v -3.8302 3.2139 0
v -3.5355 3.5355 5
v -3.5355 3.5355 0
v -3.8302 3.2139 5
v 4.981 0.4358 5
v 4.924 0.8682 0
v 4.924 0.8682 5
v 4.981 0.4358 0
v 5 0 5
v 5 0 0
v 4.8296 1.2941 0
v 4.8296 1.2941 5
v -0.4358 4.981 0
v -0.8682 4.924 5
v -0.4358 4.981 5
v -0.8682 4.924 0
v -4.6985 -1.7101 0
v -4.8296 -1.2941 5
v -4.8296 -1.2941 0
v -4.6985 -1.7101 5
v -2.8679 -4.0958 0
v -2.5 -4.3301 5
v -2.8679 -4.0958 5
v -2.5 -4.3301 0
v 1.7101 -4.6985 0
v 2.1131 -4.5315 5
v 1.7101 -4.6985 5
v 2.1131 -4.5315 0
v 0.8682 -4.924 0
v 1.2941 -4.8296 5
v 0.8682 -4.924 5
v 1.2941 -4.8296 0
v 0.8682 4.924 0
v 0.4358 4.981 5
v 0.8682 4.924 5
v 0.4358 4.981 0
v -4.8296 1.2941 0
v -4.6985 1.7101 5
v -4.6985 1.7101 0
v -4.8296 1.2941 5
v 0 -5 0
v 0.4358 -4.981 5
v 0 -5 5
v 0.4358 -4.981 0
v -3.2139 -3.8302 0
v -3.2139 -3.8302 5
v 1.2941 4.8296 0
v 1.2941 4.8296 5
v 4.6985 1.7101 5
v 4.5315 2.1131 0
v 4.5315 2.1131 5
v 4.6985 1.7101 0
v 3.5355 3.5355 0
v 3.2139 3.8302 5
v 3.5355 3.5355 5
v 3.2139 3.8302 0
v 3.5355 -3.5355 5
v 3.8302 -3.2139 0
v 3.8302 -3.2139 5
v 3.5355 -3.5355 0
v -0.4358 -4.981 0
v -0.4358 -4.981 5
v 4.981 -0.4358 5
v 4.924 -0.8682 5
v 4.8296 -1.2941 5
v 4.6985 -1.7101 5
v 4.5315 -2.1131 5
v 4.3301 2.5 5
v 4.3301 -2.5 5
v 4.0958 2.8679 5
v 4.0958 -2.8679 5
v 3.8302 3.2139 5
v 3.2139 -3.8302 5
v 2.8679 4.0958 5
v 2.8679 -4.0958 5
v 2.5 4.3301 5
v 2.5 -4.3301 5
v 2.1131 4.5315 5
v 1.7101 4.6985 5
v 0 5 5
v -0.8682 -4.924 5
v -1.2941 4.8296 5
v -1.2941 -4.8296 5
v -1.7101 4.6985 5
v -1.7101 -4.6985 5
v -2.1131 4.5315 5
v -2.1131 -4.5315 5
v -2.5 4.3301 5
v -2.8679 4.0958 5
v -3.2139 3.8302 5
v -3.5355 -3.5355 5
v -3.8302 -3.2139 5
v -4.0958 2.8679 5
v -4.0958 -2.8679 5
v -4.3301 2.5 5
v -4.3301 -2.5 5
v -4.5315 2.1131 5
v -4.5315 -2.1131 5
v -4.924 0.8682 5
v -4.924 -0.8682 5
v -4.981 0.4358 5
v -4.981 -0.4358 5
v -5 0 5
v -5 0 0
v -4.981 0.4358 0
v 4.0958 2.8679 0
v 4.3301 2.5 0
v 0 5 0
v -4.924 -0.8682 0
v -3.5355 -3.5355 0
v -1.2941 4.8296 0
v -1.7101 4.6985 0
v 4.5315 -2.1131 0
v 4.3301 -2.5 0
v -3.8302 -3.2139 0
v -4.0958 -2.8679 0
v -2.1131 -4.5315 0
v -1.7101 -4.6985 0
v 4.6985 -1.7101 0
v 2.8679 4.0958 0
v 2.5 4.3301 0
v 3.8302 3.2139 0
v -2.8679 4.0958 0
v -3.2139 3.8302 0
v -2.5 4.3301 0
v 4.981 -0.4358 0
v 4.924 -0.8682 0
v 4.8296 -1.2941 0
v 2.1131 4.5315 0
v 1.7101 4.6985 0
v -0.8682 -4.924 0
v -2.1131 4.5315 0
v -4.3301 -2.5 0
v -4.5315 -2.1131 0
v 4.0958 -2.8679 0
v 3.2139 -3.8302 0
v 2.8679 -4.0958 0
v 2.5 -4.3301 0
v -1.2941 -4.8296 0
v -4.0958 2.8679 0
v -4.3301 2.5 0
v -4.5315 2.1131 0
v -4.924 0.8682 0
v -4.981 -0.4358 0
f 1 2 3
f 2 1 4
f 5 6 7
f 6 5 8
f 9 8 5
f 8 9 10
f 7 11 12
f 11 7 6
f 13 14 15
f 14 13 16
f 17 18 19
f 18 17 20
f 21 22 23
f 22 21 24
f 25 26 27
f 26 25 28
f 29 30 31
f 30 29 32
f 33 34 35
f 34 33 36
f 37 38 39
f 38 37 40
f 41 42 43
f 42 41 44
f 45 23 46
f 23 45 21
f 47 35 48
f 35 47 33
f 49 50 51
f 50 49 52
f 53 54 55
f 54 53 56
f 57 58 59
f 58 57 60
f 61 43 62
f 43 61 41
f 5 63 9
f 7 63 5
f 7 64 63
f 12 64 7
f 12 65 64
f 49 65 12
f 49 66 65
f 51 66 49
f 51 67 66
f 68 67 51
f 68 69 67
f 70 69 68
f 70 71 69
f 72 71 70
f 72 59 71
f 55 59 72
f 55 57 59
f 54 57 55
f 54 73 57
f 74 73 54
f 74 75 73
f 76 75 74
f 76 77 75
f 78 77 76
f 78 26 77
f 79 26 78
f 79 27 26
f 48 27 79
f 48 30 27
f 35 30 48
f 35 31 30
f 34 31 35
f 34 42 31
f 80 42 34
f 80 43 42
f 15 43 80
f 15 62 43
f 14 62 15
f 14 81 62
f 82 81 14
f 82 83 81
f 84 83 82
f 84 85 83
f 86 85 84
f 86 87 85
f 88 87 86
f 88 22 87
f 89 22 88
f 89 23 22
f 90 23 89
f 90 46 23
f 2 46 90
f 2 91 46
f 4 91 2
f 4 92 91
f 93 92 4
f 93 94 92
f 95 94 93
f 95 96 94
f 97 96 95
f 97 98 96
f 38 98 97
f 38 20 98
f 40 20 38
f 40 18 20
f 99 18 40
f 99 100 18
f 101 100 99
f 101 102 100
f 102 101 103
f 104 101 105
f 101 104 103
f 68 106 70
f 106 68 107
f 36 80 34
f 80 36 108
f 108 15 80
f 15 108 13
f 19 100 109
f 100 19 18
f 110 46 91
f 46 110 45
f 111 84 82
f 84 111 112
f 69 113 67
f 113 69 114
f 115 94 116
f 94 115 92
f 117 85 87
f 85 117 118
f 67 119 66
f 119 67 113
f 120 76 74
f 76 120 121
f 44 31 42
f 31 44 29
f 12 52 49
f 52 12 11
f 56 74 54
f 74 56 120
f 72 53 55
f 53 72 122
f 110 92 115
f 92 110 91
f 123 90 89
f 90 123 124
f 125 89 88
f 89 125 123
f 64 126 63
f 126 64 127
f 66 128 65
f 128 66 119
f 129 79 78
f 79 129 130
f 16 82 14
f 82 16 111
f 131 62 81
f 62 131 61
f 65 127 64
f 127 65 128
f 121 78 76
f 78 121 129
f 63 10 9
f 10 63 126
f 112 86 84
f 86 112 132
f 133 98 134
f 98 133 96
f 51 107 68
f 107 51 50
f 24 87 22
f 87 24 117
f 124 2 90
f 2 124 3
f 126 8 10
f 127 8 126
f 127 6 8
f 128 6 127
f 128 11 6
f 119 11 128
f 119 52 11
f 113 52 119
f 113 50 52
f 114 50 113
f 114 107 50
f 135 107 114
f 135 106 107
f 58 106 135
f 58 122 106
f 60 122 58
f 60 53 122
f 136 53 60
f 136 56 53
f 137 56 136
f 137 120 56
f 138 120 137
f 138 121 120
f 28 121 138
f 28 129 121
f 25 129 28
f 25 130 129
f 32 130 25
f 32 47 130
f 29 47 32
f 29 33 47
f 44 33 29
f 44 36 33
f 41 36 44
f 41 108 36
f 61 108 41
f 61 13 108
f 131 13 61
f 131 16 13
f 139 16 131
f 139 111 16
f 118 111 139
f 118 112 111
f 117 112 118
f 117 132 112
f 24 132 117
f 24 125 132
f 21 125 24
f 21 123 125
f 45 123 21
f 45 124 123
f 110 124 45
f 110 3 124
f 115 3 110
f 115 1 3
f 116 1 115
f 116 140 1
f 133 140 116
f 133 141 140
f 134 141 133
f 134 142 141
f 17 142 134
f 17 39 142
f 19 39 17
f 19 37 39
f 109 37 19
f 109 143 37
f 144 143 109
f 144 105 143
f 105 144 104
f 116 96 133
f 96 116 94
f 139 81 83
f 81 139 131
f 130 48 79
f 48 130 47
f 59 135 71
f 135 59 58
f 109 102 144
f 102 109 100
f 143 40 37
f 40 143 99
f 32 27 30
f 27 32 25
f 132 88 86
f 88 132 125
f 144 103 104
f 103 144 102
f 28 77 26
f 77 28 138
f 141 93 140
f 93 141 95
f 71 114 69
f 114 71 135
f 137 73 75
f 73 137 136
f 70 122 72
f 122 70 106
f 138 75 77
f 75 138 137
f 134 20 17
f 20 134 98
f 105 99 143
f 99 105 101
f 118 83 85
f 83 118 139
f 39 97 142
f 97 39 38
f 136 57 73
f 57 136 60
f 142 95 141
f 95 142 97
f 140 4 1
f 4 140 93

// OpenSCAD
$fn = 72;

InnerRadius = 5;
ThreadDepth = 2;
ThreadHeight = 5;
Pitch = 6;

MaxAngle=900;
SliceAngle = 1.5;
Slices = MaxAngle/SliceAngle;

Screw(5,10,3,5);

FixedCrossSection = [[InnerRadius, 0],
                     [InnerRadius + ThreadDepth, ThreadHeight * 0.4],
                     [InnerRadius + ThreadDepth, ThreadHeight * 0.6],
                     [InnerRadius, ThreadHeight]
                     ];

function Slice(angle, i, pitch) =
    let (dx = cos(angle) * FixedCrossSection[i][0])
    let (dy = sin(angle) * FixedCrossSection[i][0])
    let (h = pitch * angle / 360)
        [dx, dy, FixedCrossSection[i][1] + h];
        
function Face(angle, i) =
    let (index = angle)
    let (s0 = index * len(FixedCrossSection))
    let (p0 = s0 + i)
    let (p1 = s0 + (i + 1) % len(FixedCrossSection))
    let (s1 = (index + 1) * len(FixedCrossSection))
    let (p2 = s1 + (i + 1) % len(FixedCrossSection))
    let (p3 = s1 + i)
    [p0,p1,p2,p3];
        

module Screw(height, radius, threadDepth, threadHeight) {
    intersection() {
        translate([-(radius+threadDepth)*2,-(radius+threadDepth)*2, 0])
            cube([(radius+threadDepth)*4,(radius+threadDepth)*4, height]);
        union() {
            cylinder(r=InnerRadius,h=height);
            
            pitch = threadHeight * 1.2; //(== threadHeight * (1 + 0.6 - 0.4));
            
            maxAngle = (360 * (height + threadHeight) / pitch);
            slices = ceil(maxAngle / SliceAngle);

            
            p = [for (angle = [0:slices])
                for (i = [0:len(FixedCrossSection)-1])
                    Slice(angle * SliceAngle, i, pitch)];
                            
            f = [[for (i = [0:len(FixedCrossSection)-1]) i],
                 for (angle = [0:slices-1])
                    for (i = [0:len(FixedCrossSection)-1])
                        Face(angle, i),
                  [for (i = [len(FixedCrossSection)-1:-1:0]) i + slices*len(FixedCrossSection)]];
         
            translate([0,0,-ThreadHeight])          
            polyhedron(
                points = p,
                faces = f,
                convexity = 10);
        }
    }
}
